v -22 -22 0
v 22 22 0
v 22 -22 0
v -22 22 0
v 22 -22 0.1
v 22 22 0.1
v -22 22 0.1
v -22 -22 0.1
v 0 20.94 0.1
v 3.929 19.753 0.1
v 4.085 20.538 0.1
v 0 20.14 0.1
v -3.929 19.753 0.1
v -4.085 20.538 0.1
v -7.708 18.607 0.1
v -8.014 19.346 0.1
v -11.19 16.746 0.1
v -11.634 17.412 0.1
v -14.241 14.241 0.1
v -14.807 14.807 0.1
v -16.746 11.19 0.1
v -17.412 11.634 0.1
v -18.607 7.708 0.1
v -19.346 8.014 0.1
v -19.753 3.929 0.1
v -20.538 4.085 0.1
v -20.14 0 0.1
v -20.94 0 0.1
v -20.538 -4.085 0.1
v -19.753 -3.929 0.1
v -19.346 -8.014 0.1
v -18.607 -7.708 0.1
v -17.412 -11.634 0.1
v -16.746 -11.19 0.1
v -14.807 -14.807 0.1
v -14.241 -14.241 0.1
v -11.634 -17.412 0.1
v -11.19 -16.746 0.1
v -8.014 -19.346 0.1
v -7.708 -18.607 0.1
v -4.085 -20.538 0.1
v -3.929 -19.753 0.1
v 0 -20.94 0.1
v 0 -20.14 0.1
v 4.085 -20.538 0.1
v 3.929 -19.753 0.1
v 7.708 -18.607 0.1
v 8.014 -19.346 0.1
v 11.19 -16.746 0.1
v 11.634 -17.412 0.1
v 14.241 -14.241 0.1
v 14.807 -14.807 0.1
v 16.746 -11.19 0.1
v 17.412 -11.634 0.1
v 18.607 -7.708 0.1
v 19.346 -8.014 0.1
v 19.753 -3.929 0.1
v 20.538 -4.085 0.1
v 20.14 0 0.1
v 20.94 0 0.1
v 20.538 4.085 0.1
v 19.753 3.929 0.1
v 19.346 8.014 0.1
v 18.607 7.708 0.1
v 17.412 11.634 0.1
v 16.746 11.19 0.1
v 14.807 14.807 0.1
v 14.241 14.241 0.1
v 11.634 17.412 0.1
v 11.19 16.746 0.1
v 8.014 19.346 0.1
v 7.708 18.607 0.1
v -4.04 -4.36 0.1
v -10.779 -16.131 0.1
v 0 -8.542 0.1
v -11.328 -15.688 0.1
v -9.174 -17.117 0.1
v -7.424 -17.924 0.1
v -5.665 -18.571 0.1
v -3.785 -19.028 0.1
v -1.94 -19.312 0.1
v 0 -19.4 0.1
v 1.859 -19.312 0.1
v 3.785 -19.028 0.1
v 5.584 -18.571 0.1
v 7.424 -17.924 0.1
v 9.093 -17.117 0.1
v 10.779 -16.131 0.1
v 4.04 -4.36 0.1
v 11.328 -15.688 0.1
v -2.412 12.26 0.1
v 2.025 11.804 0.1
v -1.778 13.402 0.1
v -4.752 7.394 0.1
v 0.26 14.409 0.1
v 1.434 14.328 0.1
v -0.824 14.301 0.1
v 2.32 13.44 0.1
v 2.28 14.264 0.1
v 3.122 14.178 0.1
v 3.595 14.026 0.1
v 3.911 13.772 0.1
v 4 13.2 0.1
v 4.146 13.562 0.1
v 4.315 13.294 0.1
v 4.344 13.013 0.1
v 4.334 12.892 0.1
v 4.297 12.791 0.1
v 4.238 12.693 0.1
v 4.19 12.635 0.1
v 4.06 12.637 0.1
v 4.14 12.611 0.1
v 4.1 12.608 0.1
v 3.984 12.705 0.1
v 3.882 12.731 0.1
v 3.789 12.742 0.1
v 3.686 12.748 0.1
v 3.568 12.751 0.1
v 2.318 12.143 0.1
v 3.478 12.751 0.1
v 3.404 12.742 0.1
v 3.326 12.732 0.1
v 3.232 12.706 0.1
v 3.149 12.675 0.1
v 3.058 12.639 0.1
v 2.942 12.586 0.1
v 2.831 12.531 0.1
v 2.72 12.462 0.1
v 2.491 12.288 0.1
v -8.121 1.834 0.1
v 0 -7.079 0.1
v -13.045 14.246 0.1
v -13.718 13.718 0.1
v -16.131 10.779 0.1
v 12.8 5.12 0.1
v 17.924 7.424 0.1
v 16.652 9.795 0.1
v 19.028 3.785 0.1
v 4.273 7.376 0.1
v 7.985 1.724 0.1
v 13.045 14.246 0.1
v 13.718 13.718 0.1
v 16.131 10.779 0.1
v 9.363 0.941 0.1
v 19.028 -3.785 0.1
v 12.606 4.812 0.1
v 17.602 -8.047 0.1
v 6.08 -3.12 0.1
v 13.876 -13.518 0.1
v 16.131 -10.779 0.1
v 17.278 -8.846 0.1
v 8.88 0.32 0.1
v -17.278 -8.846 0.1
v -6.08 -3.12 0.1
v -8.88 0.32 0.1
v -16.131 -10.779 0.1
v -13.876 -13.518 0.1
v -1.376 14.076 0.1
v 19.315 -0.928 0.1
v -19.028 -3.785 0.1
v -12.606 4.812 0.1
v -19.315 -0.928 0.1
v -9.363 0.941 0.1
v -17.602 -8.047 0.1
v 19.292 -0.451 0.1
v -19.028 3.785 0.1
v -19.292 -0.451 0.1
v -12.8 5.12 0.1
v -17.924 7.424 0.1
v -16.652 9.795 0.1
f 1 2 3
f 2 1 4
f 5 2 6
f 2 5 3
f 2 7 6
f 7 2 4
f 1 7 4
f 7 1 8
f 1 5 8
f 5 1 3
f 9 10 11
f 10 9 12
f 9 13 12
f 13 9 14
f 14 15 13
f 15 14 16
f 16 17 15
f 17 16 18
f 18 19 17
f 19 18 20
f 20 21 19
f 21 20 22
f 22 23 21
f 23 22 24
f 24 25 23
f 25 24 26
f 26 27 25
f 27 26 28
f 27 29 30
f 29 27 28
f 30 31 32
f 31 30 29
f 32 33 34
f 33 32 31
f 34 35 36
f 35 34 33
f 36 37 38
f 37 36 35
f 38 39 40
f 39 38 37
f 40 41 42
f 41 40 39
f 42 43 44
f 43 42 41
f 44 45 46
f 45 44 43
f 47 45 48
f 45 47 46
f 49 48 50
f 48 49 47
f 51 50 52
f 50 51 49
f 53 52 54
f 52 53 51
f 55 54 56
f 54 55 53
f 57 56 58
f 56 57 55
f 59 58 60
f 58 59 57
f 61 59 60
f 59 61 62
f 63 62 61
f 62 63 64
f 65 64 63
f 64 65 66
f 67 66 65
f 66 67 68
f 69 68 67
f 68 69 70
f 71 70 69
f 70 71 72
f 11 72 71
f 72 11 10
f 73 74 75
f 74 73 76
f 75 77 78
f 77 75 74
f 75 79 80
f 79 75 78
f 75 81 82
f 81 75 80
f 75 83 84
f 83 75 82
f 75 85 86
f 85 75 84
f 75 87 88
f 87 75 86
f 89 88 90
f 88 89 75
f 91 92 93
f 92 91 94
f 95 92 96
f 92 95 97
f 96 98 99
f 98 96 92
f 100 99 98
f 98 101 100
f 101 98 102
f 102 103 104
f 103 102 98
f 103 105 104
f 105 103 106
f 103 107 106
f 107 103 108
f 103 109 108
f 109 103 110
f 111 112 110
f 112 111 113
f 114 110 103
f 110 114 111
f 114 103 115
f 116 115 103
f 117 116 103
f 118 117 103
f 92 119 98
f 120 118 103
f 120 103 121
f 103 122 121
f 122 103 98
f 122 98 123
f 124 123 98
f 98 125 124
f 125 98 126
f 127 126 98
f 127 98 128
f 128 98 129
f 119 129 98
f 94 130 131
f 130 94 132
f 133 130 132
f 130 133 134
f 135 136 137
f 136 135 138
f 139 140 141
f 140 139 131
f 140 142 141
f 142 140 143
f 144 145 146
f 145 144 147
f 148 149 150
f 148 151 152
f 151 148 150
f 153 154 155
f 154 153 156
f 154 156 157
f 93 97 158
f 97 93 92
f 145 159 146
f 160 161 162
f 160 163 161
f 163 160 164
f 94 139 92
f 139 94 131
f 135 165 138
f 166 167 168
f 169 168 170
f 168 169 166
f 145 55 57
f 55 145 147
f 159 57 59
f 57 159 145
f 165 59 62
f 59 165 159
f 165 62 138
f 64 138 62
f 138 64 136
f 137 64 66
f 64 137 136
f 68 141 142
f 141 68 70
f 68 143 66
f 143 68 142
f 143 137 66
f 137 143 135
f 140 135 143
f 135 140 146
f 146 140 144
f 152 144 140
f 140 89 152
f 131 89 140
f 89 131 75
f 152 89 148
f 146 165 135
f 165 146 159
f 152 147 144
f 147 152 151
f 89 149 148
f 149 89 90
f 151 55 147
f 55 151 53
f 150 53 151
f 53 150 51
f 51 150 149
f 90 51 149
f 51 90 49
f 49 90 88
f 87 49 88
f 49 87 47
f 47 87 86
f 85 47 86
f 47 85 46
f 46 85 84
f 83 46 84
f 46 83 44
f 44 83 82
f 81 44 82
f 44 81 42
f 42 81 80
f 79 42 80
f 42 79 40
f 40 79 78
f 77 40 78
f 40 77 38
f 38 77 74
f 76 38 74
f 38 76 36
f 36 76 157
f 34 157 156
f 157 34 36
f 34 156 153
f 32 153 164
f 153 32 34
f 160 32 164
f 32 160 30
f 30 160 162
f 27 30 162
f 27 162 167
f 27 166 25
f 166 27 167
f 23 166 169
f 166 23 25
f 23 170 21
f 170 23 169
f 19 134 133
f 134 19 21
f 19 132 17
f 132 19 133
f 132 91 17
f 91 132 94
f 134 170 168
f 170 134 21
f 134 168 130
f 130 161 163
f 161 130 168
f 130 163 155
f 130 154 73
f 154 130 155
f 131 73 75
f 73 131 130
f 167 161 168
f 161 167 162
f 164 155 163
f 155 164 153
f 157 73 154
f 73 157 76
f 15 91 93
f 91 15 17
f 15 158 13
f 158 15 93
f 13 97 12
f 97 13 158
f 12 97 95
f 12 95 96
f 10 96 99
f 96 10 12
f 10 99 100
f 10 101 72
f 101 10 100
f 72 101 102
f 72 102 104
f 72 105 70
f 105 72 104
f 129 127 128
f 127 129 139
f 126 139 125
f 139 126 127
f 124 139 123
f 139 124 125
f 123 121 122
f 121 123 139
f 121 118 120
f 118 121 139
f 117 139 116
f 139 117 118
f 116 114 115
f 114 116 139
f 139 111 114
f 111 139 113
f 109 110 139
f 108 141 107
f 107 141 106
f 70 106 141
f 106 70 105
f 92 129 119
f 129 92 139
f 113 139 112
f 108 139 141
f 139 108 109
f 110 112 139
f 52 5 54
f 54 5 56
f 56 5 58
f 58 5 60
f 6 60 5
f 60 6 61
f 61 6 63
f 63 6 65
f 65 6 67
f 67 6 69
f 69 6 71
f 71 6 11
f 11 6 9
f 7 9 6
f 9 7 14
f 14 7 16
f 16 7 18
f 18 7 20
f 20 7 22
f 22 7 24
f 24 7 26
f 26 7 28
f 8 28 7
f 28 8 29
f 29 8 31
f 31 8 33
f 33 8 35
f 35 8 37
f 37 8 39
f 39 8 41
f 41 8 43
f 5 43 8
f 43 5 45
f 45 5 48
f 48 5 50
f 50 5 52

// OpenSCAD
// file: ../p/box5-12.scad
use <../lib.scad>
function ldraw_lib__box5_12() = [
// 0 Box with 5 Faces without Any Edges
// 0 Name: box5-12.dat
// 0 Author: Chris Dee [cwdee]
// 0 !LDRAW_ORG Primitive UPDATE 2009-02
// 0 !LICENSE Licensed under CC BY 4.0 : see CAreadme.txt
// 
// 0 BFC CERTIFY CCW
  [0,"BFC","CERTIFY"],
  [0,"BFC","CCW"],
// 
// 0 !HISTORY 2009-09-03 [PTadmin] Official Update 2009-02
// 
// 
// 4 16 1 1 1 1 1 -1 -1 1 -1 -1 1 1
  [4,16,1,1,1,1,1,-1,-1,1,-1,-1,1,1],
// 4 16 -1 0 1 1 0 1 1 1 1 -1 1 1
  [4,16,-1,0,1,1,0,1,1,1,1,-1,1,1],
// 4 16 -1 0 -1 -1 0 1 -1 1 1 -1 1 -1
  [4,16,-1,0,-1,-1,0,1,-1,1,1,-1,1,-1],
// 4 16 1 0 -1 -1 0 -1 -1 1 -1 1 1 -1
  [4,16,1,0,-1,-1,0,-1,-1,1,-1,1,1,-1],
// 4 16 1 0 1 1 0 -1 1 1 -1 1 1 1
  [4,16,1,0,1,1,0,-1,1,1,-1,1,1,1],
// 0
];
module ldraw_lib__box5_12(step=0, col=false, unit=2/5, alt=false, line=0.2, solid=!$preview)
    makepoly(ldraw_lib__box5_12(), step=step, col=col, unit=unit, alt=alt, line=line, solid=solid);
ldraw_lib__box5_12(line=0.2);
// main file
use <../lib.scad>
use <../p/box5-12.scad>
function ldraw_lib__6007019a() = [
// 0 Sticker  5.5 x  5.5 with S.H.I.E.L.D. Logo
// 0 Name: 6007019a.dat
// 0 Author: Reuben Pearse [ReubenPearse]
// 0 !LDRAW_ORG Part UPDATE 2025-07
// 0 !LICENSE Licensed under CC BY 4.0 : see CAreadme.txt
// 
// 0 BFC CERTIFY CCW
  [0,"BFC","CERTIFY"],
  [0,"BFC","CCW"],
// 
// 0 !KEYWORDS Avengers, Marvel, Quinjet, set 6869, Super Heroes
// 
// 0 !HISTORY 2018-12-08 [PTadmin] Official Update 2018-02
// 0 !HISTORY 2025-07-27 [OrionP] Minor header edits
// 0 !HISTORY 2025-07-27 [OrionP] Official Update 2025-07
// 
// 
// 1 16 0 -0.25 0 0 0 55 0 0.25 0 -55 0 0 box5-12.dat
  [1,16,0,-0.25,0,0,0,55,0,0.25,0,-55,0,0, ldraw_lib__box5_12()],
// 
// 4 272 0 -0.25 50.35 9.823 -0.25 49.383 10.213 -0.25 51.345 0 -0.25 52.35
  [4,272,0,-0.25,50.35,9.823,-0.25,49.383,10.213,-0.25,51.345,0,-0.25,52.35],
// 4 272 -9.823 -0.25 49.383 0 -0.25 50.35 0 -0.25 52.35 -10.213 -0.25 51.345
  [4,272,-9.823,-0.25,49.383,0,-0.25,50.35,0,-0.25,52.35,-10.213,-0.25,51.345],
// 4 272 -19.269 -0.25 46.518 -9.823 -0.25 49.383 -10.213 -0.25 51.345 -20.034 -0.25 48.366
  [4,272,-19.269,-0.25,46.518,-9.823,-0.25,49.383,-10.213,-0.25,51.345,-20.034,-0.25,48.366],
// 4 272 -27.974 -0.25 41.866 -19.269 -0.25 46.518 -20.034 -0.25 48.366 -29.086 -0.25 43.529
  [4,272,-27.974,-0.25,41.866,-19.269,-0.25,46.518,-20.034,-0.25,48.366,-29.086,-0.25,43.529],
// 4 272 -35.602 -0.25 35.602 -27.974 -0.25 41.866 -29.086 -0.25 43.529 -37.017 -0.25 37.017
  [4,272,-35.602,-0.25,35.602,-27.974,-0.25,41.866,-29.086,-0.25,43.529,-37.017,-0.25,37.017],
// 4 272 -41.866 -0.25 27.974 -35.602 -0.25 35.602 -37.017 -0.25 37.017 -43.529 -0.25 29.086
  [4,272,-41.866,-0.25,27.974,-35.602,-0.25,35.602,-37.017,-0.25,37.017,-43.529,-0.25,29.086],
// 4 272 -46.518 -0.25 19.269 -41.866 -0.25 27.974 -43.529 -0.25 29.086 -48.366 -0.25 20.034
  [4,272,-46.518,-0.25,19.269,-41.866,-0.25,27.974,-43.529,-0.25,29.086,-48.366,-0.25,20.034],
// 4 272 -49.383 -0.25 9.823 -46.518 -0.25 19.269 -48.366 -0.25 20.034 -51.345 -0.25 10.213
  [4,272,-49.383,-0.25,9.823,-46.518,-0.25,19.269,-48.366,-0.25,20.034,-51.345,-0.25,10.213],
// 4 272 -50.35 -0.25 0 -49.383 -0.25 9.823 -51.345 -0.25 10.213 -52.35 -0.25 0
  [4,272,-50.35,-0.25,0,-49.383,-0.25,9.823,-51.345,-0.25,10.213,-52.35,-0.25,0],
// 4 272 -49.383 -0.25 -9.823 -50.35 -0.25 0 -52.35 -0.25 0 -51.345 -0.25 -10.213
  [4,272,-49.383,-0.25,-9.823,-50.35,-0.25,0,-52.35,-0.25,0,-51.345,-0.25,-10.213],
// 4 272 -46.518 -0.25 -19.269 -49.383 -0.25 -9.823 -51.345 -0.25 -10.213 -48.366 -0.25 -20.034
  [4,272,-46.518,-0.25,-19.269,-49.383,-0.25,-9.823,-51.345,-0.25,-10.213,-48.366,-0.25,-20.034],
// 4 272 -41.866 -0.25 -27.974 -46.518 -0.25 -19.269 -48.366 -0.25 -20.034 -43.529 -0.25 -29.086
  [4,272,-41.866,-0.25,-27.974,-46.518,-0.25,-19.269,-48.366,-0.25,-20.034,-43.529,-0.25,-29.086],
// 4 272 -35.602 -0.25 -35.602 -41.866 -0.25 -27.974 -43.529 -0.25 -29.086 -37.017 -0.25 -37.017
  [4,272,-35.602,-0.25,-35.602,-41.866,-0.25,-27.974,-43.529,-0.25,-29.086,-37.017,-0.25,-37.017],
// 4 272 -27.974 -0.25 -41.866 -35.602 -0.25 -35.602 -37.017 -0.25 -37.017 -29.086 -0.25 -43.529
  [4,272,-27.974,-0.25,-41.866,-35.602,-0.25,-35.602,-37.017,-0.25,-37.017,-29.086,-0.25,-43.529],
// 4 272 -19.269 -0.25 -46.518 -27.974 -0.25 -41.866 -29.086 -0.25 -43.529 -20.034 -0.25 -48.366
  [4,272,-19.269,-0.25,-46.518,-27.974,-0.25,-41.866,-29.086,-0.25,-43.529,-20.034,-0.25,-48.366],
// 4 272 -9.823 -0.25 -49.383 -19.269 -0.25 -46.518 -20.034 -0.25 -48.366 -10.213 -0.25 -51.345
  [4,272,-9.823,-0.25,-49.383,-19.269,-0.25,-46.518,-20.034,-0.25,-48.366,-10.213,-0.25,-51.345],
// 4 272 0 -0.25 -50.35 -9.823 -0.25 -49.383 -10.213 -0.25 -51.345 0 -0.25 -52.35
  [4,272,0,-0.25,-50.35,-9.823,-0.25,-49.383,-10.213,-0.25,-51.345,0,-0.25,-52.35],
// 4 272 9.823 -0.25 -49.383 0 -0.25 -50.35 0 -0.25 -52.35 10.213 -0.25 -51.345
  [4,272,9.823,-0.25,-49.383,0,-0.25,-50.35,0,-0.25,-52.35,10.213,-0.25,-51.345],
// 4 272 19.269 -0.25 -46.518 9.823 -0.25 -49.383 10.213 -0.25 -51.345 20.034 -0.25 -48.366
  [4,272,19.269,-0.25,-46.518,9.823,-0.25,-49.383,10.213,-0.25,-51.345,20.034,-0.25,-48.366],
// 4 272 27.974 -0.25 -41.866 19.269 -0.25 -46.518 20.034 -0.25 -48.366 29.086 -0.25 -43.529
  [4,272,27.974,-0.25,-41.866,19.269,-0.25,-46.518,20.034,-0.25,-48.366,29.086,-0.25,-43.529],
// 4 272 35.602 -0.25 -35.602 27.974 -0.25 -41.866 29.086 -0.25 -43.529 37.017 -0.25 -37.017
  [4,272,35.602,-0.25,-35.602,27.974,-0.25,-41.866,29.086,-0.25,-43.529,37.017,-0.25,-37.017],
// 4 272 41.866 -0.25 -27.974 35.602 -0.25 -35.602 37.017 -0.25 -37.017 43.529 -0.25 -29.086
  [4,272,41.866,-0.25,-27.974,35.602,-0.25,-35.602,37.017,-0.25,-37.017,43.529,-0.25,-29.086],
// 4 272 46.518 -0.25 -19.269 41.866 -0.25 -27.974 43.529 -0.25 -29.086 48.366 -0.25 -20.034
  [4,272,46.518,-0.25,-19.269,41.866,-0.25,-27.974,43.529,-0.25,-29.086,48.366,-0.25,-20.034],
// 4 272 49.383 -0.25 -9.823 46.518 -0.25 -19.269 48.366 -0.25 -20.034 51.345 -0.25 -10.213
  [4,272,49.383,-0.25,-9.823,46.518,-0.25,-19.269,48.366,-0.25,-20.034,51.345,-0.25,-10.213],
// 4 272 50.35 -0.25 0 49.383 -0.25 -9.823 51.345 -0.25 -10.213 52.35 -0.25 0
  [4,272,50.35,-0.25,0,49.383,-0.25,-9.823,51.345,-0.25,-10.213,52.35,-0.25,0],
// 4 272 49.383 -0.25 9.823 50.35 -0.25 0 52.35 -0.25 0 51.345 -0.25 10.213
  [4,272,49.383,-0.25,9.823,50.35,-0.25,0,52.35,-0.25,0,51.345,-0.25,10.213],
// 4 272 46.518 -0.25 19.269 49.383 -0.25 9.823 51.345 -0.25 10.213 48.366 -0.25 20.034
  [4,272,46.518,-0.25,19.269,49.383,-0.25,9.823,51.345,-0.25,10.213,48.366,-0.25,20.034],
// 4 272 41.866 -0.25 27.974 46.518 -0.25 19.269 48.366 -0.25 20.034 43.529 -0.25 29.086
  [4,272,41.866,-0.25,27.974,46.518,-0.25,19.269,48.366,-0.25,20.034,43.529,-0.25,29.086],
// 4 272 35.602 -0.25 35.602 41.866 -0.25 27.974 43.529 -0.25 29.086 37.017 -0.25 37.017
  [4,272,35.602,-0.25,35.602,41.866,-0.25,27.974,43.529,-0.25,29.086,37.017,-0.25,37.017],
// 4 272 27.974 -0.25 41.866 35.602 -0.25 35.602 37.017 -0.25 37.017 29.086 -0.25 43.529
  [4,272,27.974,-0.25,41.866,35.602,-0.25,35.602,37.017,-0.25,37.017,29.086,-0.25,43.529],
// 4 272 19.269 -0.25 46.518 27.974 -0.25 41.866 29.086 -0.25 43.529 20.034 -0.25 48.366
  [4,272,19.269,-0.25,46.518,27.974,-0.25,41.866,29.086,-0.25,43.529,20.034,-0.25,48.366],
// 4 272 9.823 -0.25 49.383 19.269 -0.25 46.518 20.034 -0.25 48.366 10.213 -0.25 51.345
  [4,272,9.823,-0.25,49.383,19.269,-0.25,46.518,20.034,-0.25,48.366,10.213,-0.25,51.345],
// 4 272 0 -0.25 -21.354 -10.1 -0.25 -10.9 -28.32 -0.25 -39.219 -26.947 -0.25 -40.328
  [4,272,0,-0.25,-21.354,-10.1,-0.25,-10.9,-28.32,-0.25,-39.219,-26.947,-0.25,-40.328],
// 4 272 -18.561 -0.25 -44.809 0 -0.25 -21.354 -26.947 -0.25 -40.328 -22.936 -0.25 -42.793
  [4,272,-18.561,-0.25,-44.809,0,-0.25,-21.354,-26.947,-0.25,-40.328,-22.936,-0.25,-42.793],
// 4 272 -18.561 -0.25 -44.809 -14.162 -0.25 -46.427 -9.462 -0.25 -47.569 0 -0.25 -21.354
  [4,272,-18.561,-0.25,-44.809,-14.162,-0.25,-46.427,-9.462,-0.25,-47.569,0,-0.25,-21.354],
// 4 272 0 -0.25 -48.5 0 -0.25 -21.354 -9.462 -0.25 -47.569 -4.849 -0.25 -48.28
  [4,272,0,-0.25,-48.5,0,-0.25,-21.354,-9.462,-0.25,-47.569,-4.849,-0.25,-48.28],
// 4 272 9.462 -0.25 -47.569 0 -0.25 -21.354 0 -0.25 -48.5 4.647 -0.25 -48.28
  [4,272,9.462,-0.25,-47.569,0,-0.25,-21.354,0,-0.25,-48.5,4.647,-0.25,-48.28],
// 4 272 18.561 -0.25 -44.809 0 -0.25 -21.354 9.462 -0.25 -47.569 13.96 -0.25 -46.427
  [4,272,18.561,-0.25,-44.809,0,-0.25,-21.354,9.462,-0.25,-47.569,13.96,-0.25,-46.427],
// 4 272 18.561 -0.25 -44.809 22.733 -0.25 -42.793 26.947 -0.25 -40.328 0 -0.25 -21.354
  [4,272,18.561,-0.25,-44.809,22.733,-0.25,-42.793,26.947,-0.25,-40.328,0,-0.25,-21.354],
// 4 272 10.1 -0.25 -10.9 0 -0.25 -21.354 26.947 -0.25 -40.328 28.32 -0.25 -39.219
  [4,272,10.1,-0.25,-10.9,0,-0.25,-21.354,26.947,-0.25,-40.328,28.32,-0.25,-39.219],
// 4 272 5.062 -0.25 29.509 -4.446 -0.25 33.504 -6.03 -0.25 30.651 -11.881 -0.25 18.484
  [4,272,5.062,-0.25,29.509,-4.446,-0.25,33.504,-6.03,-0.25,30.651,-11.881,-0.25,18.484],
// 4 272 0.649 -0.25 36.023 -2.059 -0.25 35.752 5.062 -0.25 29.509 3.585 -0.25 35.819
  [4,272,0.649,-0.25,36.023,-2.059,-0.25,35.752,5.062,-0.25,29.509,3.585,-0.25,35.819],
// 4 272 3.585 -0.25 35.819 5.062 -0.25 29.509 5.8 -0.25 33.6 5.701 -0.25 35.659
  [4,272,3.585,-0.25,35.819,5.062,-0.25,29.509,5.8,-0.25,33.6,5.701,-0.25,35.659],
// 3 272 7.806 -0.25 35.446 5.701 -0.25 35.659 5.8 -0.25 33.6
  [3,272,7.806,-0.25,35.446,5.701,-0.25,35.659,5.8,-0.25,33.6],
// 4 272 8.988 -0.25 35.066 7.806 -0.25 35.446 5.8 -0.25 33.6 9.778 -0.25 34.429
  [4,272,8.988,-0.25,35.066,7.806,-0.25,35.446,5.8,-0.25,33.6,9.778,-0.25,34.429],
// 4 272 10.366 -0.25 33.904 9.778 -0.25 34.429 5.8 -0.25 33.6 10 -0.25 33
  [4,272,10.366,-0.25,33.904,9.778,-0.25,34.429,5.8,-0.25,33.6,10,-0.25,33],
// 4 272 10.788 -0.25 33.234 10.366 -0.25 33.904 10 -0.25 33 10.86 -0.25 32.533
  [4,272,10.788,-0.25,33.234,10.366,-0.25,33.904,10,-0.25,33,10.86,-0.25,32.533],
// 4 272 10.742 -0.25 31.977 10.835 -0.25 32.231 10.86 -0.25 32.533 10 -0.25 33
  [4,272,10.742,-0.25,31.977,10.835,-0.25,32.231,10.86,-0.25,32.533,10,-0.25,33],
// 4 272 10.476 -0.25 31.587 10.595 -0.25 31.732 10.742 -0.25 31.977 10 -0.25 33
  [4,272,10.476,-0.25,31.587,10.595,-0.25,31.732,10.742,-0.25,31.977,10,-0.25,33],
// 4 272 10.476 -0.25 31.587 10.151 -0.25 31.592 10.251 -0.25 31.519 10.351 -0.25 31.527
  [4,272,10.476,-0.25,31.587,10.151,-0.25,31.592,10.251,-0.25,31.519,10.351,-0.25,31.527],
// 4 272 10 -0.25 33 9.96 -0.25 31.763 10.151 -0.25 31.592 10.476 -0.25 31.587
  [4,272,10,-0.25,33,9.96,-0.25,31.763,10.151,-0.25,31.592,10.476,-0.25,31.587],
// 3 272 9.96 -0.25 31.763 10 -0.25 33 9.705 -0.25 31.827
  [3,272,9.96,-0.25,31.763,10,-0.25,33,9.705,-0.25,31.827],
// 3 272 9.472 -0.25 31.855 9.705 -0.25 31.827 10 -0.25 33
  [3,272,9.472,-0.25,31.855,9.705,-0.25,31.827,10,-0.25,33],
// 3 272 9.214 -0.25 31.87 9.472 -0.25 31.855 10 -0.25 33
  [3,272,9.214,-0.25,31.87,9.472,-0.25,31.855,10,-0.25,33],
// 3 272 8.921 -0.25 31.877 9.214 -0.25 31.87 10 -0.25 33
  [3,272,8.921,-0.25,31.877,9.214,-0.25,31.87,10,-0.25,33],
// 3 272 5.062 -0.25 29.509 5.795 -0.25 30.358 5.8 -0.25 33.6
  [3,272,5.062,-0.25,29.509,5.795,-0.25,30.358,5.8,-0.25,33.6],
// 3 272 8.696 -0.25 31.878 8.921 -0.25 31.877 10 -0.25 33
  [3,272,8.696,-0.25,31.878,8.921,-0.25,31.877,10,-0.25,33],
// 3 272 8.696 -0.25 31.878 10 -0.25 33 8.51 -0.25 31.854
  [3,272,8.696,-0.25,31.878,10,-0.25,33,8.51,-0.25,31.854],
// 4 272 8.314 -0.25 31.829 8.51 -0.25 31.854 10 -0.25 33 5.8 -0.25 33.6
  [4,272,8.314,-0.25,31.829,8.51,-0.25,31.854,10,-0.25,33,5.8,-0.25,33.6],
// 3 272 8.314 -0.25 31.829 5.8 -0.25 33.6 8.08 -0.25 31.765
  [3,272,8.314,-0.25,31.829,5.8,-0.25,33.6,8.08,-0.25,31.765],
// 3 272 7.873 -0.25 31.687 8.08 -0.25 31.765 5.8 -0.25 33.6
  [3,272,7.873,-0.25,31.687,8.08,-0.25,31.765,5.8,-0.25,33.6],
// 3 272 5.8 -0.25 33.6 7.644 -0.25 31.598 7.873 -0.25 31.687
  [3,272,5.8,-0.25,33.6,7.644,-0.25,31.598,7.873,-0.25,31.687],
// 3 272 7.644 -0.25 31.598 5.8 -0.25 33.6 7.356 -0.25 31.464
  [3,272,7.644,-0.25,31.598,5.8,-0.25,33.6,7.356,-0.25,31.464],
// 3 272 7.077 -0.25 31.327 7.356 -0.25 31.464 5.8 -0.25 33.6
  [3,272,7.077,-0.25,31.327,7.356,-0.25,31.464,5.8,-0.25,33.6],
// 3 272 7.077 -0.25 31.327 5.8 -0.25 33.6 6.799 -0.25 31.155
  [3,272,7.077,-0.25,31.327,5.8,-0.25,33.6,6.799,-0.25,31.155],
// 3 272 6.799 -0.25 31.155 5.8 -0.25 33.6 6.228 -0.25 30.72
  [3,272,6.799,-0.25,31.155,5.8,-0.25,33.6,6.228,-0.25,30.72],
// 3 272 5.795 -0.25 30.358 6.228 -0.25 30.72 5.8 -0.25 33.6
  [3,272,5.795,-0.25,30.358,6.228,-0.25,30.72,5.8,-0.25,33.6],
// 4 272 -32.612 -0.25 35.614 -20.303 -0.25 4.586 0 -0.25 -17.697 -11.881 -0.25 18.484
  [4,272,-32.612,-0.25,35.614,-20.303,-0.25,4.586,0,-0.25,-17.697,-11.881,-0.25,18.484],
// 4 272 -32.612 -0.25 35.614 -34.294 -0.25 34.294 -40.328 -0.25 26.947 -20.303 -0.25 4.586
  [4,272,-32.612,-0.25,35.614,-34.294,-0.25,34.294,-40.328,-0.25,26.947,-20.303,-0.25,4.586],
// 4 272 32 -0.25 12.8 47.569 -0.25 9.462 44.809 -0.25 18.561 41.629 -0.25 24.487
  [4,272,32,-0.25,12.8,47.569,-0.25,9.462,44.809,-0.25,18.561,41.629,-0.25,24.487],
// 4 272 32.612 -0.25 35.614 10.683 -0.25 18.439 0 -0.25 -17.697 19.963 -0.25 4.311
  [4,272,32.612,-0.25,35.614,10.683,-0.25,18.439,0,-0.25,-17.697,19.963,-0.25,4.311],
// 4 272 34.294 -0.25 34.294 32.612 -0.25 35.614 19.963 -0.25 4.311 40.328 -0.25 26.947
  [4,272,34.294,-0.25,34.294,32.612,-0.25,35.614,19.963,-0.25,4.311,40.328,-0.25,26.947],
// 4 272 31.515 -0.25 12.031 23.408 -0.25 2.352 44.005 -0.25 -20.118 47.569 -0.25 -9.462
  [4,272,31.515,-0.25,12.031,23.408,-0.25,2.352,44.005,-0.25,-20.118,47.569,-0.25,-9.462],
// 3 272 15.2 -0.25 -7.8 34.691 -0.25 -33.794 40.328 -0.25 -26.947
  [3,272,15.2,-0.25,-7.8,34.691,-0.25,-33.794,40.328,-0.25,-26.947],
// 4 272 22.2 -0.25 0.8 15.2 -0.25 -7.8 40.328 -0.25 -26.947 43.194 -0.25 -22.115
  [4,272,22.2,-0.25,0.8,15.2,-0.25,-7.8,40.328,-0.25,-26.947,43.194,-0.25,-22.115],
// 4 272 -43.194 -0.25 -22.115 -40.328 -0.25 -26.947 -15.2 -0.25 -7.8 -22.2 -0.25 0.8
  [4,272,-43.194,-0.25,-22.115,-40.328,-0.25,-26.947,-15.2,-0.25,-7.8,-22.2,-0.25,0.8],
// 3 272 -15.2 -0.25 -7.8 -40.328 -0.25 -26.947 -34.691 -0.25 -33.794
  [3,272,-15.2,-0.25,-7.8,-40.328,-0.25,-26.947,-34.691,-0.25,-33.794],
// 4 272 5.062 -0.25 29.509 -2.059 -0.25 35.752 -3.439 -0.25 35.191 -4.446 -0.25 33.504
  [4,272,5.062,-0.25,29.509,-2.059,-0.25,35.752,-3.439,-0.25,35.191,-4.446,-0.25,33.504],
// 3 272 47.569 -0.25 -9.462 48.288 -0.25 -2.319 31.515 -0.25 12.031
  [3,272,47.569,-0.25,-9.462,48.288,-0.25,-2.319,31.515,-0.25,12.031],
// 3 272 -47.569 -0.25 -9.462 -31.515 -0.25 12.031 -48.288 -0.25 -2.319
  [3,272,-47.569,-0.25,-9.462,-31.515,-0.25,12.031,-48.288,-0.25,-2.319],
// 4 272 -31.515 -0.25 12.031 -47.569 -0.25 -9.462 -44.005 -0.25 -20.118 -23.408 -0.25 2.352
  [4,272,-31.515,-0.25,12.031,-47.569,-0.25,-9.462,-44.005,-0.25,-20.118,-23.408,-0.25,2.352],
// 4 272 -11.881 -0.25 18.484 0 -0.25 -17.697 10.683 -0.25 18.439 5.062 -0.25 29.509
  [4,272,-11.881,-0.25,18.484,0,-0.25,-17.697,10.683,-0.25,18.439,5.062,-0.25,29.509],
// 3 272 32 -0.25 12.8 48.23 -0.25 -1.127 47.569 -0.25 9.462
  [3,272,32,-0.25,12.8,48.23,-0.25,-1.127,47.569,-0.25,9.462],
// 3 272 -47.569 -0.25 9.462 -48.23 -0.25 -1.127 -32 -0.25 12.8
  [3,272,-47.569,-0.25,9.462,-48.23,-0.25,-1.127,-32,-0.25,12.8],
// 4 272 -44.809 -0.25 18.561 -47.569 -0.25 9.462 -32 -0.25 12.8 -41.629 -0.25 24.487
  [4,272,-44.809,-0.25,18.561,-47.569,-0.25,9.462,-32,-0.25,12.8,-41.629,-0.25,24.487],
// 
// 4 16 44.005 -0.25 -20.118 46.518 -0.25 -19.269 49.383 -0.25 -9.823 47.569 -0.25 -9.462
  [4,16,44.005,-0.25,-20.118,46.518,-0.25,-19.269,49.383,-0.25,-9.823,47.569,-0.25,-9.462],
// 4 16 47.569 -0.25 -9.462 49.383 -0.25 -9.823 50.35 -0.25 0 48.288 -0.25 -2.319
  [4,16,47.569,-0.25,-9.462,49.383,-0.25,-9.823,50.35,-0.25,0,48.288,-0.25,-2.319],
// 4 16 48.288 -0.25 -2.319 50.35 -0.25 0 49.383 -0.25 9.823 48.23 -0.25 -1.127
  [4,16,48.288,-0.25,-2.319,50.35,-0.25,0,49.383,-0.25,9.823,48.23,-0.25,-1.127],
// 3 16 48.23 -0.25 -1.127 49.383 -0.25 9.823 47.569 -0.25 9.462
  [3,16,48.23,-0.25,-1.127,49.383,-0.25,9.823,47.569,-0.25,9.462],
// 4 16 49.383 -0.25 9.823 46.518 -0.25 19.269 44.809 -0.25 18.561 47.569 -0.25 9.462
  [4,16,49.383,-0.25,9.823,46.518,-0.25,19.269,44.809,-0.25,18.561,47.569,-0.25,9.462],
// 4 16 41.866 -0.25 27.974 41.629 -0.25 24.487 44.809 -0.25 18.561 46.518 -0.25 19.269
  [4,16,41.866,-0.25,27.974,41.629,-0.25,24.487,44.809,-0.25,18.561,46.518,-0.25,19.269],
// 4 16 34.294 -0.25 34.294 35.602 -0.25 35.602 27.974 -0.25 41.866 32.612 -0.25 35.614
  [4,16,34.294,-0.25,34.294,35.602,-0.25,35.602,27.974,-0.25,41.866,32.612,-0.25,35.614],
// 4 16 40.328 -0.25 26.947 41.866 -0.25 27.974 35.602 -0.25 35.602 34.294 -0.25 34.294
  [4,16,40.328,-0.25,26.947,41.866,-0.25,27.974,35.602,-0.25,35.602,34.294,-0.25,34.294],
// 4 16 41.866 -0.25 27.974 40.328 -0.25 26.947 32 -0.25 12.8 41.629 -0.25 24.487
  [4,16,41.866,-0.25,27.974,40.328,-0.25,26.947,32,-0.25,12.8,41.629,-0.25,24.487],
// 4 16 31.515 -0.25 12.031 32 -0.25 12.8 40.328 -0.25 26.947 19.963 -0.25 4.311
  [4,16,31.515,-0.25,12.031,32,-0.25,12.8,40.328,-0.25,26.947,19.963,-0.25,4.311],
// 3 16 31.515 -0.25 12.031 19.963 -0.25 4.311 23.408 -0.25 2.352
  [3,16,31.515,-0.25,12.031,19.963,-0.25,4.311,23.408,-0.25,2.352],
// 3 16 22.2 -0.25 0.8 23.408 -0.25 2.352 19.963 -0.25 4.311
  [3,16,22.2,-0.25,0.8,23.408,-0.25,2.352,19.963,-0.25,4.311],
// 3 16 19.963 -0.25 4.311 10.1 -0.25 -10.9 22.2 -0.25 0.8
  [3,16,19.963,-0.25,4.311,10.1,-0.25,-10.9,22.2,-0.25,0.8],
// 4 16 0 -0.25 -21.354 10.1 -0.25 -10.9 19.963 -0.25 4.311 0 -0.25 -17.697
  [4,16,0,-0.25,-21.354,10.1,-0.25,-10.9,19.963,-0.25,4.311,0,-0.25,-17.697],
// 3 16 22.2 -0.25 0.8 10.1 -0.25 -10.9 15.2 -0.25 -7.8
  [3,16,22.2,-0.25,0.8,10.1,-0.25,-10.9,15.2,-0.25,-7.8],
// 4 16 48.23 -0.25 -1.127 32 -0.25 12.8 31.515 -0.25 12.031 48.288 -0.25 -2.319
  [4,16,48.23,-0.25,-1.127,32,-0.25,12.8,31.515,-0.25,12.031,48.288,-0.25,-2.319],
// 4 16 23.408 -0.25 2.352 22.2 -0.25 0.8 43.194 -0.25 -22.115 44.005 -0.25 -20.118
  [4,16,23.408,-0.25,2.352,22.2,-0.25,0.8,43.194,-0.25,-22.115,44.005,-0.25,-20.118],
// 4 16 15.2 -0.25 -7.8 10.1 -0.25 -10.9 28.32 -0.25 -39.219 34.691 -0.25 -33.794
  [4,16,15.2,-0.25,-7.8,10.1,-0.25,-10.9,28.32,-0.25,-39.219,34.691,-0.25,-33.794],
// 4 16 44.005 -0.25 -20.118 43.194 -0.25 -22.115 41.866 -0.25 -27.974 46.518 -0.25 -19.269
  [4,16,44.005,-0.25,-20.118,43.194,-0.25,-22.115,41.866,-0.25,-27.974,46.518,-0.25,-19.269],
// 4 16 43.194 -0.25 -22.115 40.328 -0.25 -26.947 35.602 -0.25 -35.602 41.866 -0.25 -27.974
  [4,16,43.194,-0.25,-22.115,40.328,-0.25,-26.947,35.602,-0.25,-35.602,41.866,-0.25,-27.974],
// 3 16 35.602 -0.25 -35.602 40.328 -0.25 -26.947 34.691 -0.25 -33.794
  [3,16,35.602,-0.25,-35.602,40.328,-0.25,-26.947,34.691,-0.25,-33.794],
// 4 16 27.974 -0.25 -41.866 35.602 -0.25 -35.602 34.691 -0.25 -33.794 28.32 -0.25 -39.219
  [4,16,27.974,-0.25,-41.866,35.602,-0.25,-35.602,34.691,-0.25,-33.794,28.32,-0.25,-39.219],
// 3 16 27.974 -0.25 -41.866 28.32 -0.25 -39.219 26.947 -0.25 -40.328
  [3,16,27.974,-0.25,-41.866,28.32,-0.25,-39.219,26.947,-0.25,-40.328],
// 4 16 26.947 -0.25 -40.328 22.733 -0.25 -42.793 19.269 -0.25 -46.518 27.974 -0.25 -41.866
  [4,16,26.947,-0.25,-40.328,22.733,-0.25,-42.793,19.269,-0.25,-46.518,27.974,-0.25,-41.866],
// 3 16 19.269 -0.25 -46.518 22.733 -0.25 -42.793 18.561 -0.25 -44.809
  [3,16,19.269,-0.25,-46.518,22.733,-0.25,-42.793,18.561,-0.25,-44.809],
// 4 16 9.823 -0.25 -49.383 19.269 -0.25 -46.518 18.561 -0.25 -44.809 13.96 -0.25 -46.427
  [4,16,9.823,-0.25,-49.383,19.269,-0.25,-46.518,18.561,-0.25,-44.809,13.96,-0.25,-46.427],
// 3 16 9.823 -0.25 -49.383 13.96 -0.25 -46.427 9.462 -0.25 -47.569
  [3,16,9.823,-0.25,-49.383,13.96,-0.25,-46.427,9.462,-0.25,-47.569],
// 4 16 9.462 -0.25 -47.569 4.647 -0.25 -48.28 0 -0.25 -50.35 9.823 -0.25 -49.383
  [4,16,9.462,-0.25,-47.569,4.647,-0.25,-48.28,0,-0.25,-50.35,9.823,-0.25,-49.383],
// 3 16 0 -0.25 -50.35 4.647 -0.25 -48.28 0 -0.25 -48.5
  [3,16,0,-0.25,-50.35,4.647,-0.25,-48.28,0,-0.25,-48.5],
// 4 16 0 -0.25 -48.5 -4.849 -0.25 -48.28 -9.823 -0.25 -49.383 0 -0.25 -50.35
  [4,16,0,-0.25,-48.5,-4.849,-0.25,-48.28,-9.823,-0.25,-49.383,0,-0.25,-50.35],
// 3 16 -9.823 -0.25 -49.383 -4.849 -0.25 -48.28 -9.462 -0.25 -47.569
  [3,16,-9.823,-0.25,-49.383,-4.849,-0.25,-48.28,-9.462,-0.25,-47.569],
// 4 16 -9.462 -0.25 -47.569 -14.162 -0.25 -46.427 -19.269 -0.25 -46.518 -9.823 -0.25 -49.383
  [4,16,-9.462,-0.25,-47.569,-14.162,-0.25,-46.427,-19.269,-0.25,-46.518,-9.823,-0.25,-49.383],
// 3 16 -19.269 -0.25 -46.518 -14.162 -0.25 -46.427 -18.561 -0.25 -44.809
  [3,16,-19.269,-0.25,-46.518,-14.162,-0.25,-46.427,-18.561,-0.25,-44.809],
// 4 16 -27.974 -0.25 -41.866 -19.269 -0.25 -46.518 -18.561 -0.25 -44.809 -22.936 -0.25 -42.793
  [4,16,-27.974,-0.25,-41.866,-19.269,-0.25,-46.518,-18.561,-0.25,-44.809,-22.936,-0.25,-42.793],
// 3 16 -27.974 -0.25 -41.866 -22.936 -0.25 -42.793 -26.947 -0.25 -40.328
  [3,16,-27.974,-0.25,-41.866,-22.936,-0.25,-42.793,-26.947,-0.25,-40.328],
// 4 16 -26.947 -0.25 -40.328 -28.32 -0.25 -39.219 -35.602 -0.25 -35.602 -27.974 -0.25 -41.866
  [4,16,-26.947,-0.25,-40.328,-28.32,-0.25,-39.219,-35.602,-0.25,-35.602,-27.974,-0.25,-41.866],
// 3 16 -35.602 -0.25 -35.602 -28.32 -0.25 -39.219 -34.691 -0.25 -33.794
  [3,16,-35.602,-0.25,-35.602,-28.32,-0.25,-39.219,-34.691,-0.25,-33.794],
// 4 16 -40.328 -0.25 -26.947 -41.866 -0.25 -27.974 -35.602 -0.25 -35.602 -34.691 -0.25 -33.794
  [4,16,-40.328,-0.25,-26.947,-41.866,-0.25,-27.974,-35.602,-0.25,-35.602,-34.691,-0.25,-33.794],
// 3 16 -41.866 -0.25 -27.974 -40.328 -0.25 -26.947 -43.194 -0.25 -22.115
  [3,16,-41.866,-0.25,-27.974,-40.328,-0.25,-26.947,-43.194,-0.25,-22.115],
// 4 16 -43.194 -0.25 -22.115 -44.005 -0.25 -20.118 -46.518 -0.25 -19.269 -41.866 -0.25 -27.974
  [4,16,-43.194,-0.25,-22.115,-44.005,-0.25,-20.118,-46.518,-0.25,-19.269,-41.866,-0.25,-27.974],
// 4 16 -44.005 -0.25 -20.118 -47.569 -0.25 -9.462 -49.383 -0.25 -9.823 -46.518 -0.25 -19.269
  [4,16,-44.005,-0.25,-20.118,-47.569,-0.25,-9.462,-49.383,-0.25,-9.823,-46.518,-0.25,-19.269],
// 3 16 -49.383 -0.25 -9.823 -47.569 -0.25 -9.462 -48.288 -0.25 -2.319
  [3,16,-49.383,-0.25,-9.823,-47.569,-0.25,-9.462,-48.288,-0.25,-2.319],
// 3 16 -50.35 -0.25 0 -49.383 -0.25 -9.823 -48.288 -0.25 -2.319
  [3,16,-50.35,-0.25,0,-49.383,-0.25,-9.823,-48.288,-0.25,-2.319],
// 3 16 -50.35 -0.25 0 -48.288 -0.25 -2.319 -48.23 -0.25 -1.127
  [3,16,-50.35,-0.25,0,-48.288,-0.25,-2.319,-48.23,-0.25,-1.127],
// 4 16 -48.23 -0.25 -1.127 -47.569 -0.25 9.462 -49.383 -0.25 9.823 -50.35 -0.25 0
  [4,16,-48.23,-0.25,-1.127,-47.569,-0.25,9.462,-49.383,-0.25,9.823,-50.35,-0.25,0],
// 4 16 -47.569 -0.25 9.462 -44.809 -0.25 18.561 -46.518 -0.25 19.269 -49.383 -0.25 9.823
  [4,16,-47.569,-0.25,9.462,-44.809,-0.25,18.561,-46.518,-0.25,19.269,-49.383,-0.25,9.823],
// 4 16 -44.809 -0.25 18.561 -41.629 -0.25 24.487 -41.866 -0.25 27.974 -46.518 -0.25 19.269
  [4,16,-44.809,-0.25,18.561,-41.629,-0.25,24.487,-41.866,-0.25,27.974,-46.518,-0.25,19.269],
// 4 16 -35.602 -0.25 35.602 -41.866 -0.25 27.974 -40.328 -0.25 26.947 -34.294 -0.25 34.294
  [4,16,-35.602,-0.25,35.602,-41.866,-0.25,27.974,-40.328,-0.25,26.947,-34.294,-0.25,34.294],
// 4 16 -34.294 -0.25 34.294 -32.612 -0.25 35.614 -27.974 -0.25 41.866 -35.602 -0.25 35.602
  [4,16,-34.294,-0.25,34.294,-32.612,-0.25,35.614,-27.974,-0.25,41.866,-35.602,-0.25,35.602],
// 4 16 -6.03 -0.25 30.651 -27.974 -0.25 41.866 -32.612 -0.25 35.614 -11.881 -0.25 18.484
  [4,16,-6.03,-0.25,30.651,-27.974,-0.25,41.866,-32.612,-0.25,35.614,-11.881,-0.25,18.484],
// 4 16 -41.866 -0.25 27.974 -41.629 -0.25 24.487 -32 -0.25 12.8 -40.328 -0.25 26.947
  [4,16,-41.866,-0.25,27.974,-41.629,-0.25,24.487,-32,-0.25,12.8,-40.328,-0.25,26.947],
// 3 16 -40.328 -0.25 26.947 -32 -0.25 12.8 -20.303 -0.25 4.586
  [3,16,-40.328,-0.25,26.947,-32,-0.25,12.8,-20.303,-0.25,4.586],
// 4 16 -23.408 -0.25 2.352 -20.303 -0.25 4.586 -32 -0.25 12.8 -31.515 -0.25 12.031
  [4,16,-23.408,-0.25,2.352,-20.303,-0.25,4.586,-32,-0.25,12.8,-31.515,-0.25,12.031],
// 3 16 -20.303 -0.25 4.586 -23.408 -0.25 2.352 -22.2 -0.25 0.8
  [3,16,-20.303,-0.25,4.586,-23.408,-0.25,2.352,-22.2,-0.25,0.8],
// 4 16 -15.2 -0.25 -7.8 -10.1 -0.25 -10.9 -20.303 -0.25 4.586 -22.2 -0.25 0.8
  [4,16,-15.2,-0.25,-7.8,-10.1,-0.25,-10.9,-20.303,-0.25,4.586,-22.2,-0.25,0.8],
// 4 16 0 -0.25 -21.354 0 -0.25 -17.697 -20.303 -0.25 4.586 -10.1 -0.25 -10.9
  [4,16,0,-0.25,-21.354,0,-0.25,-17.697,-20.303,-0.25,4.586,-10.1,-0.25,-10.9],
// 4 16 -32 -0.25 12.8 -48.23 -0.25 -1.127 -48.288 -0.25 -2.319 -31.515 -0.25 12.031
  [4,16,-32,-0.25,12.8,-48.23,-0.25,-1.127,-48.288,-0.25,-2.319,-31.515,-0.25,12.031],
// 4 16 -43.194 -0.25 -22.115 -22.2 -0.25 0.8 -23.408 -0.25 2.352 -44.005 -0.25 -20.118
  [4,16,-43.194,-0.25,-22.115,-22.2,-0.25,0.8,-23.408,-0.25,2.352,-44.005,-0.25,-20.118],
// 4 16 -28.32 -0.25 -39.219 -10.1 -0.25 -10.9 -15.2 -0.25 -7.8 -34.691 -0.25 -33.794
  [4,16,-28.32,-0.25,-39.219,-10.1,-0.25,-10.9,-15.2,-0.25,-7.8,-34.691,-0.25,-33.794],
// 4 16 -27.974 -0.25 41.866 -6.03 -0.25 30.651 -4.446 -0.25 33.504 -19.269 -0.25 46.518
  [4,16,-27.974,-0.25,41.866,-6.03,-0.25,30.651,-4.446,-0.25,33.504,-19.269,-0.25,46.518],
// 4 16 -19.269 -0.25 46.518 -4.446 -0.25 33.504 -3.439 -0.25 35.191 -9.823 -0.25 49.383
  [4,16,-19.269,-0.25,46.518,-4.446,-0.25,33.504,-3.439,-0.25,35.191,-9.823,-0.25,49.383],
// 4 16 0 -0.25 50.35 -9.823 -0.25 49.383 -3.439 -0.25 35.191 -2.059 -0.25 35.752
  [4,16,0,-0.25,50.35,-9.823,-0.25,49.383,-3.439,-0.25,35.191,-2.059,-0.25,35.752],
// 3 16 0 -0.25 50.35 -2.059 -0.25 35.752 0.649 -0.25 36.023
  [3,16,0,-0.25,50.35,-2.059,-0.25,35.752,0.649,-0.25,36.023],
// 3 16 0 -0.25 50.35 0.649 -0.25 36.023 3.585 -0.25 35.819
  [3,16,0,-0.25,50.35,0.649,-0.25,36.023,3.585,-0.25,35.819],
// 4 16 9.823 -0.25 49.383 0 -0.25 50.35 3.585 -0.25 35.819 5.701 -0.25 35.659
  [4,16,9.823,-0.25,49.383,0,-0.25,50.35,3.585,-0.25,35.819,5.701,-0.25,35.659],
// 3 16 9.823 -0.25 49.383 5.701 -0.25 35.659 7.806 -0.25 35.446
  [3,16,9.823,-0.25,49.383,5.701,-0.25,35.659,7.806,-0.25,35.446],
// 4 16 7.806 -0.25 35.446 8.988 -0.25 35.066 19.269 -0.25 46.518 9.823 -0.25 49.383
  [4,16,7.806,-0.25,35.446,8.988,-0.25,35.066,19.269,-0.25,46.518,9.823,-0.25,49.383],
// 3 16 19.269 -0.25 46.518 8.988 -0.25 35.066 9.778 -0.25 34.429
  [3,16,19.269,-0.25,46.518,8.988,-0.25,35.066,9.778,-0.25,34.429],
// 3 16 19.269 -0.25 46.518 9.778 -0.25 34.429 10.366 -0.25 33.904
  [3,16,19.269,-0.25,46.518,9.778,-0.25,34.429,10.366,-0.25,33.904],
// 4 16 10.366 -0.25 33.904 10.788 -0.25 33.234 27.974 -0.25 41.866 19.269 -0.25 46.518
  [4,16,10.366,-0.25,33.904,10.788,-0.25,33.234,27.974,-0.25,41.866,19.269,-0.25,46.518],
// 4 16 6.228 -0.25 30.72 10.683 -0.25 18.439 7.077 -0.25 31.327 6.799 -0.25 31.155
  [4,16,6.228,-0.25,30.72,10.683,-0.25,18.439,7.077,-0.25,31.327,6.799,-0.25,31.155],
// 4 16 7.644 -0.25 31.598 7.356 -0.25 31.464 7.077 -0.25 31.327 10.683 -0.25 18.439
  [4,16,7.644,-0.25,31.598,7.356,-0.25,31.464,7.077,-0.25,31.327,10.683,-0.25,18.439],
// 4 16 8.08 -0.25 31.765 7.873 -0.25 31.687 7.644 -0.25 31.598 10.683 -0.25 18.439
  [4,16,8.08,-0.25,31.765,7.873,-0.25,31.687,7.644,-0.25,31.598,10.683,-0.25,18.439],
// 4 16 8.08 -0.25 31.765 10.683 -0.25 18.439 8.51 -0.25 31.854 8.314 -0.25 31.829
  [4,16,8.08,-0.25,31.765,10.683,-0.25,18.439,8.51,-0.25,31.854,8.314,-0.25,31.829],
// 4 16 8.51 -0.25 31.854 10.683 -0.25 18.439 8.921 -0.25 31.877 8.696 -0.25 31.878
  [4,16,8.51,-0.25,31.854,10.683,-0.25,18.439,8.921,-0.25,31.877,8.696,-0.25,31.878],
// 4 16 9.472 -0.25 31.855 9.214 -0.25 31.87 8.921 -0.25 31.877 10.683 -0.25 18.439
  [4,16,9.472,-0.25,31.855,9.214,-0.25,31.87,8.921,-0.25,31.877,10.683,-0.25,18.439],
// 4 16 9.472 -0.25 31.855 10.683 -0.25 18.439 9.96 -0.25 31.763 9.705 -0.25 31.827
  [4,16,9.472,-0.25,31.855,10.683,-0.25,18.439,9.96,-0.25,31.763,9.705,-0.25,31.827],
// 3 16 10.683 -0.25 18.439 10.151 -0.25 31.592 9.96 -0.25 31.763
  [3,16,10.683,-0.25,18.439,10.151,-0.25,31.592,9.96,-0.25,31.763],
// 3 16 10.151 -0.25 31.592 10.683 -0.25 18.439 10.251 -0.25 31.519
  [3,16,10.151,-0.25,31.592,10.683,-0.25,18.439,10.251,-0.25,31.519],
// 3 16 10.595 -0.25 31.732 10.476 -0.25 31.587 10.683 -0.25 18.439
  [3,16,10.595,-0.25,31.732,10.476,-0.25,31.587,10.683,-0.25,18.439],
// 3 16 10.742 -0.25 31.977 32.612 -0.25 35.614 10.835 -0.25 32.231
  [3,16,10.742,-0.25,31.977,32.612,-0.25,35.614,10.835,-0.25,32.231],
// 3 16 10.835 -0.25 32.231 32.612 -0.25 35.614 10.86 -0.25 32.533
  [3,16,10.835,-0.25,32.231,32.612,-0.25,35.614,10.86,-0.25,32.533],
// 4 16 27.974 -0.25 41.866 10.788 -0.25 33.234 10.86 -0.25 32.533 32.612 -0.25 35.614
  [4,16,27.974,-0.25,41.866,10.788,-0.25,33.234,10.86,-0.25,32.533,32.612,-0.25,35.614],
// 4 16 6.228 -0.25 30.72 5.795 -0.25 30.358 5.062 -0.25 29.509 10.683 -0.25 18.439
  [4,16,6.228,-0.25,30.72,5.795,-0.25,30.358,5.062,-0.25,29.509,10.683,-0.25,18.439],
// 3 16 10.251 -0.25 31.519 10.683 -0.25 18.439 10.351 -0.25 31.527
  [3,16,10.251,-0.25,31.519,10.683,-0.25,18.439,10.351,-0.25,31.527],
// 4 16 10.683 -0.25 18.439 32.612 -0.25 35.614 10.742 -0.25 31.977 10.595 -0.25 31.732
  [4,16,10.683,-0.25,18.439,32.612,-0.25,35.614,10.742,-0.25,31.977,10.595,-0.25,31.732],
// 3 16 10.476 -0.25 31.587 10.351 -0.25 31.527 10.683 -0.25 18.439
  [3,16,10.476,-0.25,31.587,10.351,-0.25,31.527,10.683,-0.25,18.439],
// 
// 0 // 4-4ndis
// 3 16 37.017 -0.25 -37.017 55 -0.25 -55 43.529 -0.25 -29.086
  [3,16,37.017,-0.25,-37.017,55,-0.25,-55,43.529,-0.25,-29.086],
// 3 16 43.529 -0.25 -29.086 55 -0.25 -55 48.366 -0.25 -20.034
  [3,16,43.529,-0.25,-29.086,55,-0.25,-55,48.366,-0.25,-20.034],
// 3 16 48.366 -0.25 -20.034 55 -0.25 -55 51.345 -0.25 -10.213
  [3,16,48.366,-0.25,-20.034,55,-0.25,-55,51.345,-0.25,-10.213],
// 3 16 51.345 -0.25 -10.213 55 -0.25 -55 52.35 -0.25 0
  [3,16,51.345,-0.25,-10.213,55,-0.25,-55,52.35,-0.25,0],
// 3 16 55 -0.25 55 52.35 -0.25 0 55 -0.25 -55
  [3,16,55,-0.25,55,52.35,-0.25,0,55,-0.25,-55],
// 3 16 52.35 -0.25 0 55 -0.25 55 51.345 -0.25 10.213
  [3,16,52.35,-0.25,0,55,-0.25,55,51.345,-0.25,10.213],
// 3 16 51.345 -0.25 10.213 55 -0.25 55 48.366 -0.25 20.034
  [3,16,51.345,-0.25,10.213,55,-0.25,55,48.366,-0.25,20.034],
// 3 16 48.366 -0.25 20.034 55 -0.25 55 43.529 -0.25 29.086
  [3,16,48.366,-0.25,20.034,55,-0.25,55,43.529,-0.25,29.086],
// 3 16 43.529 -0.25 29.086 55 -0.25 55 37.017 -0.25 37.017
  [3,16,43.529,-0.25,29.086,55,-0.25,55,37.017,-0.25,37.017],
// 
// 3 16 37.017 -0.25 37.017 55 -0.25 55 29.086 -0.25 43.529
  [3,16,37.017,-0.25,37.017,55,-0.25,55,29.086,-0.25,43.529],
// 3 16 29.086 -0.25 43.529 55 -0.25 55 20.034 -0.25 48.366
  [3,16,29.086,-0.25,43.529,55,-0.25,55,20.034,-0.25,48.366],
// 3 16 20.034 -0.25 48.366 55 -0.25 55 10.213 -0.25 51.345
  [3,16,20.034,-0.25,48.366,55,-0.25,55,10.213,-0.25,51.345],
// 3 16 10.213 -0.25 51.345 55 -0.25 55 0 -0.25 52.35
  [3,16,10.213,-0.25,51.345,55,-0.25,55,0,-0.25,52.35],
// 3 16 -55 -0.25 55 0 -0.25 52.35 55 -0.25 55
  [3,16,-55,-0.25,55,0,-0.25,52.35,55,-0.25,55],
// 3 16 0 -0.25 52.35 -55 -0.25 55 -10.213 -0.25 51.345
  [3,16,0,-0.25,52.35,-55,-0.25,55,-10.213,-0.25,51.345],
// 3 16 -10.213 -0.25 51.345 -55 -0.25 55 -20.034 -0.25 48.366
  [3,16,-10.213,-0.25,51.345,-55,-0.25,55,-20.034,-0.25,48.366],
// 3 16 -20.034 -0.25 48.366 -55 -0.25 55 -29.086 -0.25 43.529
  [3,16,-20.034,-0.25,48.366,-55,-0.25,55,-29.086,-0.25,43.529],
// 3 16 -29.086 -0.25 43.529 -55 -0.25 55 -37.017 -0.25 37.017
  [3,16,-29.086,-0.25,43.529,-55,-0.25,55,-37.017,-0.25,37.017],
// 
// 3 16 -37.017 -0.25 37.017 -55 -0.25 55 -43.529 -0.25 29.086
  [3,16,-37.017,-0.25,37.017,-55,-0.25,55,-43.529,-0.25,29.086],
// 3 16 -43.529 -0.25 29.086 -55 -0.25 55 -48.366 -0.25 20.034
  [3,16,-43.529,-0.25,29.086,-55,-0.25,55,-48.366,-0.25,20.034],
// 3 16 -48.366 -0.25 20.034 -55 -0.25 55 -51.345 -0.25 10.213
  [3,16,-48.366,-0.25,20.034,-55,-0.25,55,-51.345,-0.25,10.213],
// 3 16 -51.345 -0.25 10.213 -55 -0.25 55 -52.35 -0.25 0
  [3,16,-51.345,-0.25,10.213,-55,-0.25,55,-52.35,-0.25,0],
// 3 16 -55 -0.25 -55 -52.35 -0.25 0 -55 -0.25 55
  [3,16,-55,-0.25,-55,-52.35,-0.25,0,-55,-0.25,55],
// 3 16 -52.35 -0.25 0 -55 -0.25 -55 -51.345 -0.25 -10.213
  [3,16,-52.35,-0.25,0,-55,-0.25,-55,-51.345,-0.25,-10.213],
// 3 16 -51.345 -0.25 -10.213 -55 -0.25 -55 -48.366 -0.25 -20.034
  [3,16,-51.345,-0.25,-10.213,-55,-0.25,-55,-48.366,-0.25,-20.034],
// 3 16 -48.366 -0.25 -20.034 -55 -0.25 -55 -43.529 -0.25 -29.086
  [3,16,-48.366,-0.25,-20.034,-55,-0.25,-55,-43.529,-0.25,-29.086],
// 3 16 -43.529 -0.25 -29.086 -55 -0.25 -55 -37.017 -0.25 -37.017
  [3,16,-43.529,-0.25,-29.086,-55,-0.25,-55,-37.017,-0.25,-37.017],
// 
// 3 16 -37.017 -0.25 -37.017 -55 -0.25 -55 -29.086 -0.25 -43.529
  [3,16,-37.017,-0.25,-37.017,-55,-0.25,-55,-29.086,-0.25,-43.529],
// 3 16 -29.086 -0.25 -43.529 -55 -0.25 -55 -20.034 -0.25 -48.366
  [3,16,-29.086,-0.25,-43.529,-55,-0.25,-55,-20.034,-0.25,-48.366],
// 3 16 -20.034 -0.25 -48.366 -55 -0.25 -55 -10.213 -0.25 -51.345
  [3,16,-20.034,-0.25,-48.366,-55,-0.25,-55,-10.213,-0.25,-51.345],
// 3 16 -10.213 -0.25 -51.345 -55 -0.25 -55 0 -0.25 -52.35
  [3,16,-10.213,-0.25,-51.345,-55,-0.25,-55,0,-0.25,-52.35],
// 3 16 55 -0.25 -55 0 -0.25 -52.35 -55 -0.25 -55
  [3,16,55,-0.25,-55,0,-0.25,-52.35,-55,-0.25,-55],
// 3 16 0 -0.25 -52.35 55 -0.25 -55 10.213 -0.25 -51.345
  [3,16,0,-0.25,-52.35,55,-0.25,-55,10.213,-0.25,-51.345],
// 3 16 10.213 -0.25 -51.345 55 -0.25 -55 20.034 -0.25 -48.366
  [3,16,10.213,-0.25,-51.345,55,-0.25,-55,20.034,-0.25,-48.366],
// 3 16 20.034 -0.25 -48.366 55 -0.25 -55 29.086 -0.25 -43.529
  [3,16,20.034,-0.25,-48.366,55,-0.25,-55,29.086,-0.25,-43.529],
// 3 16 29.086 -0.25 -43.529 55 -0.25 -55 37.017 -0.25 -37.017
  [3,16,29.086,-0.25,-43.529,55,-0.25,-55,37.017,-0.25,-37.017],
];
module ldraw_lib__6007019a(step=0, col=false, unit=2/5, alt=false, line=0.2, solid=!$preview)
    makepoly(ldraw_lib__6007019a(), step=step, col=col, unit=unit, alt=alt, line=line, solid=solid);
ldraw_lib__6007019a(line=0.2);
